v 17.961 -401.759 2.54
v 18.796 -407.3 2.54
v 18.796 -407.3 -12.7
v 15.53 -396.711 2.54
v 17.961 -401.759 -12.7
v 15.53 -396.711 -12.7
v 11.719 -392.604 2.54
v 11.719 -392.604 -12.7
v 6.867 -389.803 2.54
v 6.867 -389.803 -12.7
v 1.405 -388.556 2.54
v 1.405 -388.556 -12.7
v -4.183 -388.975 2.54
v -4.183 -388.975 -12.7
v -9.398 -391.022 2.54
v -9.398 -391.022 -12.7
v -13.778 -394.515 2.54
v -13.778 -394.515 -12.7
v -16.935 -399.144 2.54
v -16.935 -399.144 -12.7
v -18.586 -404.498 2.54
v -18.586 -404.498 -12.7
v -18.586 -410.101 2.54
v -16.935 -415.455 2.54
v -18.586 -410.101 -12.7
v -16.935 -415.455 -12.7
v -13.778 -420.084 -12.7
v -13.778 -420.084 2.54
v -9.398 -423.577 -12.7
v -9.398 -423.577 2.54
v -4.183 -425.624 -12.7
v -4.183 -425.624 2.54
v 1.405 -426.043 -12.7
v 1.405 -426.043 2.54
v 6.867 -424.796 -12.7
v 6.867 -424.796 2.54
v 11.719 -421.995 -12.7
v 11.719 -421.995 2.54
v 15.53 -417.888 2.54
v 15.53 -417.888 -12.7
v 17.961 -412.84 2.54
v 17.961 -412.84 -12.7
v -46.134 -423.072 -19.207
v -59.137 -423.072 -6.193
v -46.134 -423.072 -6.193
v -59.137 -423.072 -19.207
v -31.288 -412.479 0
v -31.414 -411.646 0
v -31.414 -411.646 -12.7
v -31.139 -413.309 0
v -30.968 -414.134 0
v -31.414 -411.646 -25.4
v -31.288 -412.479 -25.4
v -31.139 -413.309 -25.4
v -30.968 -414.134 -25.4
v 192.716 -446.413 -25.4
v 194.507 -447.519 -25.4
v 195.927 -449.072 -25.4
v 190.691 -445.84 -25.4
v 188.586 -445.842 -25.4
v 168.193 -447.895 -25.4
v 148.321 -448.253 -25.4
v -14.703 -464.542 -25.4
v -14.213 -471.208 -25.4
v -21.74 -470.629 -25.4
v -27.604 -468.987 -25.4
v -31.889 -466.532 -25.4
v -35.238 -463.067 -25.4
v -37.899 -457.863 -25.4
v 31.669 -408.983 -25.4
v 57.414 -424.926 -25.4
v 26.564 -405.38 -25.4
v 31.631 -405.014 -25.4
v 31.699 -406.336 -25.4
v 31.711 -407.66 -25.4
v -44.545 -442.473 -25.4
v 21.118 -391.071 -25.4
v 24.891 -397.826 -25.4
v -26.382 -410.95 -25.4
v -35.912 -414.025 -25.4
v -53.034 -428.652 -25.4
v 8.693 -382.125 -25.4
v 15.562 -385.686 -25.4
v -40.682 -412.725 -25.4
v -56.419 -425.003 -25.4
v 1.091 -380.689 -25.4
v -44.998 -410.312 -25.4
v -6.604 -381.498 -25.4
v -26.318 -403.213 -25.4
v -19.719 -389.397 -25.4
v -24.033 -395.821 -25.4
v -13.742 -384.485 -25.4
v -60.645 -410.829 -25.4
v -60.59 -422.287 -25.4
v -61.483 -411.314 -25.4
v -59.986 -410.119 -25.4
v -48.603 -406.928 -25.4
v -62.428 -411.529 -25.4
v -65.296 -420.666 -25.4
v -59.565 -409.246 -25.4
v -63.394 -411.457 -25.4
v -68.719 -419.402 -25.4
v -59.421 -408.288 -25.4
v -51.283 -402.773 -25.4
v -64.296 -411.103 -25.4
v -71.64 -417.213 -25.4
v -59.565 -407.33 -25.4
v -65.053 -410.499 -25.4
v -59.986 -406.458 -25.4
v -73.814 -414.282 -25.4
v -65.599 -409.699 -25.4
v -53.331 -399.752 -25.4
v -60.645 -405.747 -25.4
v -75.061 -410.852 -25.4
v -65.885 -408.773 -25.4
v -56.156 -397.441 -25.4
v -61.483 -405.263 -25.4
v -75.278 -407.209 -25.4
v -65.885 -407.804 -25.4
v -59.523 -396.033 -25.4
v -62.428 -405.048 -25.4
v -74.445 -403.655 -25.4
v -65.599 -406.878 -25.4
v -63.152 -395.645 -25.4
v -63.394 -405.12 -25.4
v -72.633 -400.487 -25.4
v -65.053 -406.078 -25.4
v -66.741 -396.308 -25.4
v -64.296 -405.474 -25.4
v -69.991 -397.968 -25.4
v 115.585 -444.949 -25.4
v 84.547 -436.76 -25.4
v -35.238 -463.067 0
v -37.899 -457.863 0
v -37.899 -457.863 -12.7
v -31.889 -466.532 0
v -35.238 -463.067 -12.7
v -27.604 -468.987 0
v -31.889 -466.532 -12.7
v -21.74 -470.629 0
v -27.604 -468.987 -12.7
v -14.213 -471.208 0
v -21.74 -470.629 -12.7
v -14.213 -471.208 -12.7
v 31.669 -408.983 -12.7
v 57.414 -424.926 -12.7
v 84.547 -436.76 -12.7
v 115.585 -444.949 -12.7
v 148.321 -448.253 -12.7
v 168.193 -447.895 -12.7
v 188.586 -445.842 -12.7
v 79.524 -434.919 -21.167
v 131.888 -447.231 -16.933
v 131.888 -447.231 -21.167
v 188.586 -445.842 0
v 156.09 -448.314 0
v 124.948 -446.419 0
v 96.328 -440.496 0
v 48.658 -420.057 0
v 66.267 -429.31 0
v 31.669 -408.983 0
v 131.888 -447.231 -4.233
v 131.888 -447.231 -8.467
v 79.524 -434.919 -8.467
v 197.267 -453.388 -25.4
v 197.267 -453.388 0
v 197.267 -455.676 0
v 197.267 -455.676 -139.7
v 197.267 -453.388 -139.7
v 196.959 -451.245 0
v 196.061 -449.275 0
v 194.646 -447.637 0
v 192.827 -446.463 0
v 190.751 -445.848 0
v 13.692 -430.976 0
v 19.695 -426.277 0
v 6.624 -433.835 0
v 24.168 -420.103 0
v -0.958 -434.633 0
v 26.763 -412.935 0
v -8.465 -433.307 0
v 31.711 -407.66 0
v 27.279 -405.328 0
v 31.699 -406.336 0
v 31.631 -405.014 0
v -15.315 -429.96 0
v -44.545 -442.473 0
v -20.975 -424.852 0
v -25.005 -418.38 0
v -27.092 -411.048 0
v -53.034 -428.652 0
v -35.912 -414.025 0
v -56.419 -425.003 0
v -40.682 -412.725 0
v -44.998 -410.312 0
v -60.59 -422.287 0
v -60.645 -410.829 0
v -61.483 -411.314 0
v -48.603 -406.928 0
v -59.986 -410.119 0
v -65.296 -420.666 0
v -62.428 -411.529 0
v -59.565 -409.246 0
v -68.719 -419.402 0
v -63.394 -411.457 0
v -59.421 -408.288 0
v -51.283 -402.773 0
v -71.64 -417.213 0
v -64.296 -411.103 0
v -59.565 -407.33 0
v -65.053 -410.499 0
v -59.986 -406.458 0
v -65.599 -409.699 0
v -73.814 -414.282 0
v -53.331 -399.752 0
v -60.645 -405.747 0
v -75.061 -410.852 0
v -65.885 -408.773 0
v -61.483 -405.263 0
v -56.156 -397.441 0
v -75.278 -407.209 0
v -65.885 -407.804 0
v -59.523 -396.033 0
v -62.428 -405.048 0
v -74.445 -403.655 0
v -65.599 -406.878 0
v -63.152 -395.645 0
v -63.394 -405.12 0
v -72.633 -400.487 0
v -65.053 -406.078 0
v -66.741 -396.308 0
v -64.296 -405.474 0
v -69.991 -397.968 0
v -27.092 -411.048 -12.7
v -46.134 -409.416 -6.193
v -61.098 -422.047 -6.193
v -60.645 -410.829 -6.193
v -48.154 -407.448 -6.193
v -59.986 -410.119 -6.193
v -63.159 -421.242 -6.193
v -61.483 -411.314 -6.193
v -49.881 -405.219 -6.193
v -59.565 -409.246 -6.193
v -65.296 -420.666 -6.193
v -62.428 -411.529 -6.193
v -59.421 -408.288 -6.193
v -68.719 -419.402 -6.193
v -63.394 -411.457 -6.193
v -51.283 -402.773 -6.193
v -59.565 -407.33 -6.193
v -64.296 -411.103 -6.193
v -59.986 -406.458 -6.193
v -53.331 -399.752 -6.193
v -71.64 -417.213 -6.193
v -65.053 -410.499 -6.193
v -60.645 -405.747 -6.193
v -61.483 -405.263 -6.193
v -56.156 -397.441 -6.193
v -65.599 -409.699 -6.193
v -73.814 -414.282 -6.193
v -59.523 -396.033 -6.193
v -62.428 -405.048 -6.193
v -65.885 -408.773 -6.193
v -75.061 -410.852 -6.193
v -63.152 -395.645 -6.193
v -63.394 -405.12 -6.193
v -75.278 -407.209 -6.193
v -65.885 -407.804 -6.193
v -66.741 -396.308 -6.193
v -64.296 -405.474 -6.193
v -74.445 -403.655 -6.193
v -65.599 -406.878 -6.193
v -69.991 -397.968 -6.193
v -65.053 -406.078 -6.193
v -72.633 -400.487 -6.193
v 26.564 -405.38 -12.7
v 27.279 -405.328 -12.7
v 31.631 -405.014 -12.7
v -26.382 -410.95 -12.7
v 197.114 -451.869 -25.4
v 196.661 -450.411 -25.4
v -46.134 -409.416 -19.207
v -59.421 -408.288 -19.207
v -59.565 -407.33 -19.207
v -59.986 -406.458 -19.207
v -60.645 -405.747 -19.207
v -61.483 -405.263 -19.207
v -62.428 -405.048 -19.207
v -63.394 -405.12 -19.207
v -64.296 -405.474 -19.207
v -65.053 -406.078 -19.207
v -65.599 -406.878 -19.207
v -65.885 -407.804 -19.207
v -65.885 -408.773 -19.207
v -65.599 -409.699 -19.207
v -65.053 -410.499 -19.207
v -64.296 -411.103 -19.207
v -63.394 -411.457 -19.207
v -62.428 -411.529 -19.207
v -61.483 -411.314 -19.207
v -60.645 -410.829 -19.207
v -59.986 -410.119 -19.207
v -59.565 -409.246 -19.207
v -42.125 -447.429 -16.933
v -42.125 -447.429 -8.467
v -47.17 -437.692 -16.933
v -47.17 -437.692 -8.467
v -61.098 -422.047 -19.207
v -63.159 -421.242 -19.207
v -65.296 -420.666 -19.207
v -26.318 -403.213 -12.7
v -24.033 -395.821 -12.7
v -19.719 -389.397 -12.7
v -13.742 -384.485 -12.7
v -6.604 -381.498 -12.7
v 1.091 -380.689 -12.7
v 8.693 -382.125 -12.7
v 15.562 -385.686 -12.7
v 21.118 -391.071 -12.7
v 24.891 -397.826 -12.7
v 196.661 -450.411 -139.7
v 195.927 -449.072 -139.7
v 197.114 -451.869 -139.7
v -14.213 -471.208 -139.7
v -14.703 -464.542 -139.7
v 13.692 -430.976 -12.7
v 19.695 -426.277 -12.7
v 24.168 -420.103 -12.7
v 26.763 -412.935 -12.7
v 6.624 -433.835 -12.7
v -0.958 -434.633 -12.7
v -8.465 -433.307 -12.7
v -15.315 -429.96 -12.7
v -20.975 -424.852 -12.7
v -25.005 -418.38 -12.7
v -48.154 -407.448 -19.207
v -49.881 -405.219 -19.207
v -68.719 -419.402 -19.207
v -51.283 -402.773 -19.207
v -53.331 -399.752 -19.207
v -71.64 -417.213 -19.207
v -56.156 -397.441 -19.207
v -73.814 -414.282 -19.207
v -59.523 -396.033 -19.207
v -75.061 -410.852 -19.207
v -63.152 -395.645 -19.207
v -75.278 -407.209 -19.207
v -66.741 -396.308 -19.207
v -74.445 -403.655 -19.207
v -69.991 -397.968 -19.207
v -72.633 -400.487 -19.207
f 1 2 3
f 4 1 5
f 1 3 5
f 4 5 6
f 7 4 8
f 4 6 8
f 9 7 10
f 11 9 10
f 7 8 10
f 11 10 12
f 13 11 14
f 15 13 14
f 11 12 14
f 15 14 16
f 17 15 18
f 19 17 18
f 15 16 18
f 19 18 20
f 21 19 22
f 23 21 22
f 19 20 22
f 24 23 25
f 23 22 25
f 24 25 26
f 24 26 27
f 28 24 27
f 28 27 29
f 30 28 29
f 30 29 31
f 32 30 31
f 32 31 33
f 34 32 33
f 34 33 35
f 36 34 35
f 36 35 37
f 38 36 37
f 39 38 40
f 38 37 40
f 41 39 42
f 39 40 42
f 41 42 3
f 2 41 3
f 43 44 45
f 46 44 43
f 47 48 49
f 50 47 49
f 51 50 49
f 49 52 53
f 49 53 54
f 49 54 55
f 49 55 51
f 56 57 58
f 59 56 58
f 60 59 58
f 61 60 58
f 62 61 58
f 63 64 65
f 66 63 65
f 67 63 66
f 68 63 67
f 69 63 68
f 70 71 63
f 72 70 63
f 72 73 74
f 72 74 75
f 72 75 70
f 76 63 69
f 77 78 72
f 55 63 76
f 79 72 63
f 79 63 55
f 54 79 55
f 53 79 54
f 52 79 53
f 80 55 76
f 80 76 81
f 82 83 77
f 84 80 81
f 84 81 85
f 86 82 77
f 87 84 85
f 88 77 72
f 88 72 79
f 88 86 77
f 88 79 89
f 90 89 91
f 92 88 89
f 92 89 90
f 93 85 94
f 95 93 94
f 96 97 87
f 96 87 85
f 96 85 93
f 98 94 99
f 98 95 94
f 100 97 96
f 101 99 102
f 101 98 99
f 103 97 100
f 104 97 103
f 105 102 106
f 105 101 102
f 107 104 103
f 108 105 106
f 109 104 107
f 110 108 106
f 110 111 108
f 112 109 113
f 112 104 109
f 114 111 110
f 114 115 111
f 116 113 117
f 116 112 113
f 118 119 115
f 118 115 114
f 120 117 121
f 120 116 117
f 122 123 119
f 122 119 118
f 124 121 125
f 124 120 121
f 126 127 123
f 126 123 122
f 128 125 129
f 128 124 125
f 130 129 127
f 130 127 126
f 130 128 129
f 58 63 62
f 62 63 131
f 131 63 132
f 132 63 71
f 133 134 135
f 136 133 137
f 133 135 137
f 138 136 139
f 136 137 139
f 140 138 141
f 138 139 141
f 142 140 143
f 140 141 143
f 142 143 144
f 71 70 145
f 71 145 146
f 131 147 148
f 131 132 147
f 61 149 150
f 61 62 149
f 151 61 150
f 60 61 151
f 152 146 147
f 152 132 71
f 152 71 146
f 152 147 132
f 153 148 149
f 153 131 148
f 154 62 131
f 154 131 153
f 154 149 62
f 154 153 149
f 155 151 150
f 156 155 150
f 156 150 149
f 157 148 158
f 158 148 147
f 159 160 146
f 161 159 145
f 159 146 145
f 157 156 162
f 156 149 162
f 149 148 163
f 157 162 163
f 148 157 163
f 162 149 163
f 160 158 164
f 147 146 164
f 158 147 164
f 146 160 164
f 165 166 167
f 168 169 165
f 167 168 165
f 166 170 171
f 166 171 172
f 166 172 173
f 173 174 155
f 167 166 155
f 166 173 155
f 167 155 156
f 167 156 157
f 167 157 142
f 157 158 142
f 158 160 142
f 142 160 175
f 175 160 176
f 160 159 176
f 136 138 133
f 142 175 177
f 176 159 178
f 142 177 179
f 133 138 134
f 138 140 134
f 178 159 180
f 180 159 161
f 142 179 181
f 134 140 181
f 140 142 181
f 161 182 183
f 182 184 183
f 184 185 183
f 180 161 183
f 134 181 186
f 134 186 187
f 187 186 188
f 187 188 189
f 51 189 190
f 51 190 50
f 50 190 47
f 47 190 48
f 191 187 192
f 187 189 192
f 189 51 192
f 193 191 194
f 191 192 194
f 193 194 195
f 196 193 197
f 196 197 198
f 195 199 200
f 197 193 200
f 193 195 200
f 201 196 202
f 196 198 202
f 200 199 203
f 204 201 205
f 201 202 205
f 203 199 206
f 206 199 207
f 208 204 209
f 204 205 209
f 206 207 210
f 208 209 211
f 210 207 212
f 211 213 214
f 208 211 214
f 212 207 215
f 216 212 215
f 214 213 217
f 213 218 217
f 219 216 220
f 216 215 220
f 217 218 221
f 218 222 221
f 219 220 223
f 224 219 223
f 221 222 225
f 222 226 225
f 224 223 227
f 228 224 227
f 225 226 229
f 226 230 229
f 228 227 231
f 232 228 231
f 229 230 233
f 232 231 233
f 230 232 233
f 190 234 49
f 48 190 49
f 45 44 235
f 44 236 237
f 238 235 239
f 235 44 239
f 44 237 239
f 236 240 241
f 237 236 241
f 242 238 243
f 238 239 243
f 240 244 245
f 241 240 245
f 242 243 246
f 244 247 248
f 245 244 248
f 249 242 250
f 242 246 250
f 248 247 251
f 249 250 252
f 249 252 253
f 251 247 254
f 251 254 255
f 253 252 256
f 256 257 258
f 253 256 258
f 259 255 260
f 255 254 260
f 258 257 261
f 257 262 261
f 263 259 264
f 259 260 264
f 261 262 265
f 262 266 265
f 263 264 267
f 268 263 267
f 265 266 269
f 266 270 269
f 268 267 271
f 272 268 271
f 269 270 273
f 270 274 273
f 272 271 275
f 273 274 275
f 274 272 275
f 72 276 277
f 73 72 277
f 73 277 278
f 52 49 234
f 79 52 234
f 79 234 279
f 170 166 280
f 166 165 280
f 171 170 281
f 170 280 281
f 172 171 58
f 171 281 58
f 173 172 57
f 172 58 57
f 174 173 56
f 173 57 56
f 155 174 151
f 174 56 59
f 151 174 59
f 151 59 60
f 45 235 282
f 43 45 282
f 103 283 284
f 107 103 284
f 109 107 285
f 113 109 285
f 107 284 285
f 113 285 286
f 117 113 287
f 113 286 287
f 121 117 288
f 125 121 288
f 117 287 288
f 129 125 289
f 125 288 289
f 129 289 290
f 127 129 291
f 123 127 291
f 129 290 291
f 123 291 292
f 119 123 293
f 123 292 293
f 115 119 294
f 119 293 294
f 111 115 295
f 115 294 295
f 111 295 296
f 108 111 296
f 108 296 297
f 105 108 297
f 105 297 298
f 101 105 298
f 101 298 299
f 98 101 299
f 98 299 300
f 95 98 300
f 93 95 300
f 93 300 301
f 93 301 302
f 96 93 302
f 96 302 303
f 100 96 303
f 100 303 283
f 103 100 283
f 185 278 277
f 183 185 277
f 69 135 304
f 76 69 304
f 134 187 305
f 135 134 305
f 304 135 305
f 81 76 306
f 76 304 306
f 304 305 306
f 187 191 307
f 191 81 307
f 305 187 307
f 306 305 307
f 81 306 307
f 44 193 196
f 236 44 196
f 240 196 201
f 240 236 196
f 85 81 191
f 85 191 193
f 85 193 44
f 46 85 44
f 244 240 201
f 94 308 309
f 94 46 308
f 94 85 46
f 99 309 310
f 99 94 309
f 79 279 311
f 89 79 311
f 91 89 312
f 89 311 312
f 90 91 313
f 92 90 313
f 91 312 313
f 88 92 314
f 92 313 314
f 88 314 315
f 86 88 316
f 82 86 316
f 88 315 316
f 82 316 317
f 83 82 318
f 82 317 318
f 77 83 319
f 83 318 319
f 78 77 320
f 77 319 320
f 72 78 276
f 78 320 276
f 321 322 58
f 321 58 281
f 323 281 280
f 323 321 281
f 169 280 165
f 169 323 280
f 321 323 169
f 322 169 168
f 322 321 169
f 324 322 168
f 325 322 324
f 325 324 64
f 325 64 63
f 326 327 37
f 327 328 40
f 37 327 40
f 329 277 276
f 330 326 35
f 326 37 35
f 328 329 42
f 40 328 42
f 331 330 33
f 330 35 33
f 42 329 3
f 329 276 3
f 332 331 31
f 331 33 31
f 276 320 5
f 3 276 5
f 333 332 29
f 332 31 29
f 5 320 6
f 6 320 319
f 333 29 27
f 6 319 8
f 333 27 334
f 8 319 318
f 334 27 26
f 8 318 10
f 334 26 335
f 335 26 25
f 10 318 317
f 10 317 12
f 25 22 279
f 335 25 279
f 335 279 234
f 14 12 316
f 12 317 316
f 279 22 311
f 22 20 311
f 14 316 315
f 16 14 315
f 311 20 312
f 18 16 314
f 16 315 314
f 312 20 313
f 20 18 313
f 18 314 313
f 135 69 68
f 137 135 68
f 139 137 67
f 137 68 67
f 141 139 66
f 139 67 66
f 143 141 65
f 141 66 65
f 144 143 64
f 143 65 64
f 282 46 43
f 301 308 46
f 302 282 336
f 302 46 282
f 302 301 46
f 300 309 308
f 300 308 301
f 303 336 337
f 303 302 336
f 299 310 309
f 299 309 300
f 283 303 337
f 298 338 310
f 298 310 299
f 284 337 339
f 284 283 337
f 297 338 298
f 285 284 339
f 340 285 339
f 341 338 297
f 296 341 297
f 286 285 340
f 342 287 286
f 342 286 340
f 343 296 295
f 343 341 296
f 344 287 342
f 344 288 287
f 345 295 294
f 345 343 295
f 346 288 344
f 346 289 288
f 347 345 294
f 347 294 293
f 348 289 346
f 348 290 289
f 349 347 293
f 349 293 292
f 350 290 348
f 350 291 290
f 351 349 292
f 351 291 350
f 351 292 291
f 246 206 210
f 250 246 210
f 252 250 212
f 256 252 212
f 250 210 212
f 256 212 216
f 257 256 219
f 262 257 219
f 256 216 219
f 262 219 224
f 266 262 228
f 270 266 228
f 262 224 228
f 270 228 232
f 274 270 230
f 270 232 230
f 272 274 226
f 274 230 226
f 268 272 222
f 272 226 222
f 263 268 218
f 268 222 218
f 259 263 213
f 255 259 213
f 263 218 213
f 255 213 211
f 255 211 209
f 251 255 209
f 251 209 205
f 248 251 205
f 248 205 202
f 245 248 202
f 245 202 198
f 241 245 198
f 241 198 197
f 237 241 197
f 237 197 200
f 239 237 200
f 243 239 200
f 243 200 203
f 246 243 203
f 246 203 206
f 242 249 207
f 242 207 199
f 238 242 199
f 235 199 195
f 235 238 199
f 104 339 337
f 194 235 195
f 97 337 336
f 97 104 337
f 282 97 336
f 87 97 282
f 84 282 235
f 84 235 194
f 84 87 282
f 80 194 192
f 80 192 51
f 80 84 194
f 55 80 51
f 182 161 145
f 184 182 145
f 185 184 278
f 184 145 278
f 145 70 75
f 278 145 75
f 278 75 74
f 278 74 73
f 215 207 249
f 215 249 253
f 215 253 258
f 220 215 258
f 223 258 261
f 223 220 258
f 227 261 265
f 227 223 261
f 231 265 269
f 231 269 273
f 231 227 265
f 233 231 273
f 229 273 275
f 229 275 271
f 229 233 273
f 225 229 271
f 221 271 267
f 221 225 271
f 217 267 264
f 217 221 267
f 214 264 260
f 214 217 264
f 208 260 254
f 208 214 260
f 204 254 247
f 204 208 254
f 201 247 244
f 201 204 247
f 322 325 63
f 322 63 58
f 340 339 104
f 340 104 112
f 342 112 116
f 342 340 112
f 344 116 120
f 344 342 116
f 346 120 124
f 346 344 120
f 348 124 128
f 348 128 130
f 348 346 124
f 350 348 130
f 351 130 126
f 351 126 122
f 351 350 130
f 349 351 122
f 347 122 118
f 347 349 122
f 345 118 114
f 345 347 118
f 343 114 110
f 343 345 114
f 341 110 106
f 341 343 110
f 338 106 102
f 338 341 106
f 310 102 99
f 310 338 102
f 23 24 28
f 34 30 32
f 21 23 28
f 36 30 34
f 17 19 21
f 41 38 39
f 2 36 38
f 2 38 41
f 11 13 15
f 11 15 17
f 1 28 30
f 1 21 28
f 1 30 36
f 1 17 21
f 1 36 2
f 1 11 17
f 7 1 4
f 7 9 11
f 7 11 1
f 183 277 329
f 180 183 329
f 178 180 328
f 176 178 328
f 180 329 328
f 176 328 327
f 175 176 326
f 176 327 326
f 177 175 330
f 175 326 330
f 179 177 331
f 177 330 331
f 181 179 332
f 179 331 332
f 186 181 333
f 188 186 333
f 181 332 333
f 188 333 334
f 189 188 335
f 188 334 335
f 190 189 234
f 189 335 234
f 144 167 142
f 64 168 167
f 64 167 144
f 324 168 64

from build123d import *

# Parameters (mm, degrees)
BOSS_EXTRUDE1_DEPTH      = 2.54
BOSS_EXTRUDE1_DEPTH_BACK = 12.7
SKETCH1_R                = 18.796
SKETCH2_R                = 18.796
BOSS_EXTRUDE2_DEPTH      = 12.7
BOSS_EXTRUDE3_DEPTH      = 12.7
BOSS_EXTRUDE5_DEPTH      = 12.7
BOSS_EXTRUDE6_DEPTH      = 12.7
SKETCH7_R                = 18.796
BOSS_EXTRUDE7_DEPTH      = 12.7
BOSS_EXTRUDE8_DEPTH      = 25.4
SKETCH11_R               = 12.652854813
BOSS_EXTRUDE10_DEPTH     = 25.4
SKETCH12_R               = 3.250000001
CUT_EXTRUDE2_DEPTH       = 512.464850261
FILLET1_R                = 20.32
BOSS_EXTRUDE11_START     = 114.3
BOSS_EXTRUDE11_DEPTH     = 114.3
SKETCH16_W               = 13.01344698
SKETCH16_H               = 28.816569003
CUT_EXTRUDE4_DEPTH       = 54.61


with BuildPart() as part:
    # Sketch1 → Boss-Extrude1 (new, two sides: drawn at the far end of the back side and taken through both)
    with BuildSketch(Plane.XY.offset(-BOSS_EXTRUDE1_DEPTH_BACK)):
        with Locations((0, -407.299625141)):
            Circle(SKETCH1_R)
    extrude(amount=BOSS_EXTRUDE1_DEPTH + BOSS_EXTRUDE1_DEPTH_BACK)



with BuildPart() as body_2:
    # Sketch2 → Boss-Extrude2 (new body)
    with BuildSketch(Plane(origin=(0, 0, -12.7), x_dir=(-1, 0, 0), z_dir=(0, 0, -1))):
        with BuildLine():
            Line((-26.564149005, -405.379934257), (-31.63093582, -405.013776678))
            ThreePointArc((-31.63093582, -405.013776678), (-3.317825996, -438.839016934), (31.414187958, -411.645887785))
            Line((31.414187958, -411.645887785), (26.382120799, -410.949683715))
            ThreePointArc((26.382120799, -410.949683715), (2.786361575, -380.812356225), (-26.564149005, -405.379934257))
        make_face()
        with Locations(Location((0, -407.299625141, 0), (0, 0, 180))):
            Circle(SKETCH2_R, mode=Mode.SUBTRACT)
    extrude(amount=BOSS_EXTRUDE2_DEPTH)

    # Sketch3 → Boss-Extrude3 (add)
    with BuildSketch(Plane(origin=(0, 0, -25.4), x_dir=(-1, 0, 0), z_dir=(0, 0, -1))):
        with BuildLine():
            Line((14.213346722, -471.208070579), (-197.266538305, -455.67583119))
            Line((-197.266538305, -455.67583119), (-197.266538305, -453.387916788))
            ThreePointArc((-197.266538305, -453.387916788), (-194.645764338, -447.637078669), (-188.586186842, -445.842053367))
            add(Edge.make_bspline(
                [(-31.668722049, -408.98285055), (-77.209858947, -441.706865094), (-129.780268895, -454.105513447), (-188.586186842, -445.842053367)],
                knots=[0, 0, 0, 0, 0.953344593, 0.953344593, 0.953344593, 0.953344593], degree=3))
            ThreePointArc((-31.668722049, -408.98285055), (-2.599324763, -438.906344597), (30.96823039, -414.134090044))
            add(Edge.make_bspline(
                [(30.96823039, -414.134090044), (32.649949124, -424.470701531), (41.040109499, -436.729451805), (38.639174938, -461.09372409), (31.686044055, -471.208070579), (14.213346722, -471.208070579)],
                knots=[0, 0, 0, 0, 0.443747805, 0.572878395, 1, 1, 1, 1], degree=3))
        make_face()
    extrude(amount=-BOSS_EXTRUDE3_DEPTH)

    # Sketch5 → Boss-Extrude5 (add)
    with BuildSketch(Plane.XY.offset(-12.7)):
        with BuildLine():
            Line((31.63093582, -405.013776678), (27.278929363, -405.328279775))
            ThreePointArc((27.278929363, -405.328279775), (2.861336178, -434.499605748), (-27.092003196, -411.047898425))
            Line((-27.092003196, -411.047898425), (-31.414187958, -411.645887785))
            ThreePointArc((-31.414187958, -411.645887785), (3.317825996, -438.839016934), (31.63093582, -405.013776678))
        make_face()
    extrude(amount=BOSS_EXTRUDE5_DEPTH)

    # Sketch6 → Boss-Extrude6 (add)
    with BuildSketch(Plane.XY.offset(-12.7)):
        with BuildLine():
            Line((-14.213346722, -471.208070579), (197.266538305, -455.67583119))
            Line((197.266538305, -455.67583119), (197.266538305, -453.387916788))
            ThreePointArc((197.266538305, -453.387916788), (194.645764338, -447.637078669), (188.586186842, -445.842053367))
            add(Edge.make_bspline(
                [(188.586186842, -445.842053367), (129.780268895, -454.105513447), (77.209858947, -441.706865094), (31.668722049, -408.98285055)],
                knots=[0, 0, 0, 0, 0.953344593, 0.953344593, 0.953344593, 0.953344593], degree=3))
            ThreePointArc((31.668722049, -408.98285055), (2.599324763, -438.906344597), (-30.96823039, -414.134090044))
            add(Edge.make_bspline(
                [(-30.96823039, -414.134090044), (-32.649949124, -424.470701531), (-41.040109499, -436.729451805), (-38.639174938, -461.09372409), (-31.686044055, -471.208070579), (-14.213346722, -471.208070579)],
                knots=[0, 0, 0, 0, 0.443747805, 0.572878395, 1, 1, 1, 1], degree=3))
        make_face()
    extrude(amount=BOSS_EXTRUDE6_DEPTH)


with BuildPart() as part_1:
    add(part.part)

    add(body_2.part)  # Boss-Extrude7 merges body 2
    # Sketch7 → Boss-Extrude7 (add)
    with BuildSketch(Plane(origin=(0, 0, -12.7), x_dir=(-1, 0, 0), z_dir=(0, 0, -1))):
        with Locations(Location((0, -407.299625141, 0), (0, 0, 180))):
            Circle(SKETCH7_R)
    extrude(amount=BOSS_EXTRUDE7_DEPTH)

    # Sketch8 → Boss-Extrude8 (add)
    with BuildSketch(Plane.XY):
        with BuildLine():
            ThreePointArc((-58.391711784, -403.636078411), (-67.121824198, -403.800195984), (-67.358685042, -412.528637671))
            add(Edge.make_bspline(
                [(-37.899374688, -457.862620823), (-44.280461027, -439.825230998), (-54.11365555, -424.711188181), (-67.358685042, -412.528637671)],
                knots=[0, 0, 0, 0, 0.648412371, 0.648412371, 0.648412371, 0.648412371], degree=3))
            add(Edge.make_bspline(
                [(-30.96823039, -414.134090044), (-32.649949124, -424.470701531), (-41.040109499, -436.729451805), (-39.512215319, -452.234259992), (-38.376068735, -456.515151772), (-37.899374688, -457.862620823)],
                knots=[0, 0, 0, 0, 0.443747805, 0.572878395, 0.636374771, 0.636374771, 0.636374771, 0.636374771], degree=3))
            add(Edge.make_bspline(
                [(-30.96823039, -414.134090044), (-41.722283963, -415.45839081), (-50.863444428, -411.959053599), (-58.391711784, -403.636078411)],
                knots=[0, 0, 0, 0, 0.680532916, 0.680532916, 0.680532916, 0.680532916], degree=3))
        make_face()
    extrude(amount=-BOSS_EXTRUDE8_DEPTH)

    # Sketch11 → Boss-Extrude10 (add)
    with BuildSketch(Plane.XY):
        with Locations((-62.670851235, -408.28841522)):
            Circle(SKETCH11_R)
    extrude(amount=-BOSS_EXTRUDE10_DEPTH)

    # Sketch12 → Cut-Extrude2 (cut, through all)
    with BuildSketch(Plane.XY):
        with Locations((-62.670851235, -408.28841522)):
            Circle(SKETCH12_R)
    extrude(amount=-CUT_EXTRUDE2_DEPTH, mode=Mode.SUBTRACT)

    # Fillet1
    # the kernel refuses this fillet: 20.32 mm, written as the material it adds along each edge
    with BuildSketch(Plane(origin=(-59.511042023, -420.540367745, -25.4), x_dir=(-0.9997641834800511, -0.021715833635081266, 0), z_dir=(0, 0, 1))) as fillet1_piece_1:
        with BuildLine():
            CenterArc((10.432056933, 19.781724025), FILLET1_R, 214.575044889, 42.207687895)
            Line((-6.299098106, 8.250425267), (-6.633721207, 8.019799292))
            ThreePointArc((-6.633721207, 8.019799292), (-3.573104641, 3.801857042), (-0.310609577, -0.26207375))
            Line((-0.310609577, -0.26207375), (0.09292103, -0.395634481))
            ThreePointArc((0.09292103, -0.395634481), (2.893002714, -0.07122639), (5.693084398, -0.395634481))
            Line((5.693084398, -0.395634481), (5.786005428, 0))
        make_face()
    extrude(amount=25.4)
    with BuildSketch(Plane(origin=(-50.199792551, -410.425569918, -25.4), x_dir=(0.981910282713407, -0.18934676311381016, 0), z_dir=(0, 0, 1))) as fillet1_piece_2:
        with BuildLine():
            CenterArc((13.766955548, 19.469018818), FILLET1_R, 216.757393509, 69.882984253)
            Line((-2.512952914, 7.308962056), (-2.838551084, 7.065760921))
            ThreePointArc((-2.838551084, 7.065760921), (-1.069058095, 3.718918839), (-0.406312291, -0.008442875))
            Line((-0.406312291, -0.008442875), (-0.135668955, -0.383086015))
            ThreePointArc((-0.135668955, -0.383086015), (9.809532931, -2.061533892), (19.702243107, -0.389380376))
            Line((19.702243107, -0.389380376), (19.58586492, 0))
        make_face()
    extrude(amount=25.4)

    # Sketch15 → Boss-Extrude11 (add)
    with BuildSketch(Plane(origin=(0, 0, -25.4), x_dir=(-1, 0, 0), z_dir=(0, 0, -1)).offset(BOSS_EXTRUDE11_START)):
        with BuildLine():
            Line((-197.266538305, -455.67583119), (14.213346722, -471.208070579))
            Line((14.213346722, -471.208070579), (14.702923537, -464.542216029))
            Line((14.702923537, -464.542216029), (-195.926737542, -449.072421737))
            ThreePointArc((-195.926737542, -449.072421737), (-196.923883913, -451.12857155), (-197.266538305, -453.387916788))
            Line((-197.266538305, -453.387916788), (-197.266538305, -455.67583119))
        make_face()
    extrude(amount=-BOSS_EXTRUDE11_DEPTH)

    # Sketch16 → Cut-Extrude4 (cut)
    with BuildSketch(Plane(origin=(-100.744249605, 0, 0), x_dir=(0, 0, -1), z_dir=(1, 0, 0))):
        with Locations((12.7, -408.663339092)):
            Rectangle(SKETCH16_W, SKETCH16_H)
    extrude(amount=CUT_EXTRUDE4_DEPTH, mode=Mode.SUBTRACT)


solid = part_1.part
